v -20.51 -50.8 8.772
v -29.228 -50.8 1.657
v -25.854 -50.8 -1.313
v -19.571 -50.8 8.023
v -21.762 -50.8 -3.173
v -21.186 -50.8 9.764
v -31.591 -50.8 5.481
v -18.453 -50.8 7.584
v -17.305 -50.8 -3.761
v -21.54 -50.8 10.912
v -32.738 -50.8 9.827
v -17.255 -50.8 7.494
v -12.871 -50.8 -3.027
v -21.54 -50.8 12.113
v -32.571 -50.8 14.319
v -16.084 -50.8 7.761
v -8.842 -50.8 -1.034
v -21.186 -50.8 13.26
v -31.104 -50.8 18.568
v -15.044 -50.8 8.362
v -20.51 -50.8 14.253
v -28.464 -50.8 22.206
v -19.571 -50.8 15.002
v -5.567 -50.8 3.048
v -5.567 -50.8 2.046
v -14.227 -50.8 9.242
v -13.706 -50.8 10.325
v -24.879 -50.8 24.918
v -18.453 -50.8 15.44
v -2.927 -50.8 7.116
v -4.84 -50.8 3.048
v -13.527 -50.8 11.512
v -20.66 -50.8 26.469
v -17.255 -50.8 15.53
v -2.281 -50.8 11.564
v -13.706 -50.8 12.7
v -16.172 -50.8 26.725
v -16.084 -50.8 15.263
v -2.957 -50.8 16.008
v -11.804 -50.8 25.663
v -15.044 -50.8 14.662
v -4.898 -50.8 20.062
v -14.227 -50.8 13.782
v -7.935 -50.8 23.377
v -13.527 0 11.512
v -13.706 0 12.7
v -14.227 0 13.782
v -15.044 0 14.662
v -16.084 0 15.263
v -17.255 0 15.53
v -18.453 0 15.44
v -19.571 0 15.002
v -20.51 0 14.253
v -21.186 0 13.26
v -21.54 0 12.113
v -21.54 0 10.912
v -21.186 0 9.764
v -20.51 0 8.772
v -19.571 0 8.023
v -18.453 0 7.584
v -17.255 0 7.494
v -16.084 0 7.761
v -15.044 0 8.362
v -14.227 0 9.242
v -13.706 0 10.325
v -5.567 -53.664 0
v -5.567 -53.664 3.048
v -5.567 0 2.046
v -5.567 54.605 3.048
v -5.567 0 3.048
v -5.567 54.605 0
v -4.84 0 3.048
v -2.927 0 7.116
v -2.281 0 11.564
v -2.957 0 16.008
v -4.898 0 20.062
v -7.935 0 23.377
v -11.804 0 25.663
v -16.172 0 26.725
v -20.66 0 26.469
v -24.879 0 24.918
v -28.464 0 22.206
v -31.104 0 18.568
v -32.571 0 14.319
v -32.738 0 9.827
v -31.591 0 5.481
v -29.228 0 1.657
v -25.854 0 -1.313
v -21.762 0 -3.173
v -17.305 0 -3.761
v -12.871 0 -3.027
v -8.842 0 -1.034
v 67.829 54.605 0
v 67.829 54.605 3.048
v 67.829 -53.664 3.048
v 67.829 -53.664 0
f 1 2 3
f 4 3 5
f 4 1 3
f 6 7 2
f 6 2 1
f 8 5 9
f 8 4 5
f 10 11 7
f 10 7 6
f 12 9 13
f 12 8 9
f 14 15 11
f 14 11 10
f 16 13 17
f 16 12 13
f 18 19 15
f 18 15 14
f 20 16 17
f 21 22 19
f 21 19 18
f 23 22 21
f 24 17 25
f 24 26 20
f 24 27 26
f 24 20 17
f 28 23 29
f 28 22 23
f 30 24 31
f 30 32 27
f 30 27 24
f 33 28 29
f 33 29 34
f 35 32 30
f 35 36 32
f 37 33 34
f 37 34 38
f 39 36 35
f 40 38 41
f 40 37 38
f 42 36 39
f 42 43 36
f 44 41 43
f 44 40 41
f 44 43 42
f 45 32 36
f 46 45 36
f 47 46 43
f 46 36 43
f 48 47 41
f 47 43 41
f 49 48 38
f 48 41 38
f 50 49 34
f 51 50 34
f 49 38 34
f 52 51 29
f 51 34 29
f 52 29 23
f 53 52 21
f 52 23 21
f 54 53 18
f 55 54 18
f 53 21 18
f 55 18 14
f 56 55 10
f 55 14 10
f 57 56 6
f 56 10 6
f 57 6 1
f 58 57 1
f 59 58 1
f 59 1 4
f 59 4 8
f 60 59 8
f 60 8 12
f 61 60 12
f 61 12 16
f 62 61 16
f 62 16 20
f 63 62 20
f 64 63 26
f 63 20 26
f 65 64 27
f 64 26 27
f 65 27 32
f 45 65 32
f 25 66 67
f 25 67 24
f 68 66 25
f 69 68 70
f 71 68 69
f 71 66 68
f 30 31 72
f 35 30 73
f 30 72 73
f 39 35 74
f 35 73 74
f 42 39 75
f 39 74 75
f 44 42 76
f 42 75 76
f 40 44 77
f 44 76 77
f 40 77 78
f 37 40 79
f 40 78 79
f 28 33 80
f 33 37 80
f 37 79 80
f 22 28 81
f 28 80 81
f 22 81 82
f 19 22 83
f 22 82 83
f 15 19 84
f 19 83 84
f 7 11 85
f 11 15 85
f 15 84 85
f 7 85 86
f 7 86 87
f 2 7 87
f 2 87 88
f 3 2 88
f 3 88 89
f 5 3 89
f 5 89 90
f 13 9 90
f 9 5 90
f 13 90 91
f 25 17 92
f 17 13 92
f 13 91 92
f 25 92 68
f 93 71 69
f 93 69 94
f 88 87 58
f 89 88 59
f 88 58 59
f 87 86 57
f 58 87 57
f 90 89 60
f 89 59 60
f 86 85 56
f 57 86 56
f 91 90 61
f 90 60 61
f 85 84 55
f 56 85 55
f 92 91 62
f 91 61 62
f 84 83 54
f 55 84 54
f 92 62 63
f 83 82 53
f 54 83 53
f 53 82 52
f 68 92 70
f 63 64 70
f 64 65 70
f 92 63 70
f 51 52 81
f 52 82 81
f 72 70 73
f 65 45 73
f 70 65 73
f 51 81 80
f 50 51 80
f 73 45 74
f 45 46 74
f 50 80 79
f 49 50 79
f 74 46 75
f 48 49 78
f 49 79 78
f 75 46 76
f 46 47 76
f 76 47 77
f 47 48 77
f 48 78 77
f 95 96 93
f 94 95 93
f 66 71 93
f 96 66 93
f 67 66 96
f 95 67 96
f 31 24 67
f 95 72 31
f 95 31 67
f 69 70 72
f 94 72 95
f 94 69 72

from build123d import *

# Parameters (mm, degrees)
F0_W     = 73.396001
F0_H     = 108.268451
F1_DEPTH = 3.048
F2_R     = 15.275412
F3_DEPTH = 50.8
F4_R     = 4.02928
F5_DEPTH = 50.8


with BuildPart() as f1:
    # F0 (on Top) → F1 (new body)
    with BuildSketch(Plane.XY):
        with Locations((31.130662, 0.470406)):
            Rectangle(F0_W, F0_H)
    extrude(amount=F1_DEPTH)

    # F2 (on Front) → F3 (join)
    with BuildSketch(Plane.XZ):
        with Locations((-17.556151, 11.512231)):
            Circle(F2_R)
    extrude(amount=F3_DEPTH)

    # F4 (on face) → F5 (cut)
    with BuildSketch(Plane.XZ.offset(50.8)):
        with Locations((-17.556151, 11.512231)):
            Circle(F4_R)
    extrude(amount=-F5_DEPTH, mode=Mode.SUBTRACT)


solid = f1.part
